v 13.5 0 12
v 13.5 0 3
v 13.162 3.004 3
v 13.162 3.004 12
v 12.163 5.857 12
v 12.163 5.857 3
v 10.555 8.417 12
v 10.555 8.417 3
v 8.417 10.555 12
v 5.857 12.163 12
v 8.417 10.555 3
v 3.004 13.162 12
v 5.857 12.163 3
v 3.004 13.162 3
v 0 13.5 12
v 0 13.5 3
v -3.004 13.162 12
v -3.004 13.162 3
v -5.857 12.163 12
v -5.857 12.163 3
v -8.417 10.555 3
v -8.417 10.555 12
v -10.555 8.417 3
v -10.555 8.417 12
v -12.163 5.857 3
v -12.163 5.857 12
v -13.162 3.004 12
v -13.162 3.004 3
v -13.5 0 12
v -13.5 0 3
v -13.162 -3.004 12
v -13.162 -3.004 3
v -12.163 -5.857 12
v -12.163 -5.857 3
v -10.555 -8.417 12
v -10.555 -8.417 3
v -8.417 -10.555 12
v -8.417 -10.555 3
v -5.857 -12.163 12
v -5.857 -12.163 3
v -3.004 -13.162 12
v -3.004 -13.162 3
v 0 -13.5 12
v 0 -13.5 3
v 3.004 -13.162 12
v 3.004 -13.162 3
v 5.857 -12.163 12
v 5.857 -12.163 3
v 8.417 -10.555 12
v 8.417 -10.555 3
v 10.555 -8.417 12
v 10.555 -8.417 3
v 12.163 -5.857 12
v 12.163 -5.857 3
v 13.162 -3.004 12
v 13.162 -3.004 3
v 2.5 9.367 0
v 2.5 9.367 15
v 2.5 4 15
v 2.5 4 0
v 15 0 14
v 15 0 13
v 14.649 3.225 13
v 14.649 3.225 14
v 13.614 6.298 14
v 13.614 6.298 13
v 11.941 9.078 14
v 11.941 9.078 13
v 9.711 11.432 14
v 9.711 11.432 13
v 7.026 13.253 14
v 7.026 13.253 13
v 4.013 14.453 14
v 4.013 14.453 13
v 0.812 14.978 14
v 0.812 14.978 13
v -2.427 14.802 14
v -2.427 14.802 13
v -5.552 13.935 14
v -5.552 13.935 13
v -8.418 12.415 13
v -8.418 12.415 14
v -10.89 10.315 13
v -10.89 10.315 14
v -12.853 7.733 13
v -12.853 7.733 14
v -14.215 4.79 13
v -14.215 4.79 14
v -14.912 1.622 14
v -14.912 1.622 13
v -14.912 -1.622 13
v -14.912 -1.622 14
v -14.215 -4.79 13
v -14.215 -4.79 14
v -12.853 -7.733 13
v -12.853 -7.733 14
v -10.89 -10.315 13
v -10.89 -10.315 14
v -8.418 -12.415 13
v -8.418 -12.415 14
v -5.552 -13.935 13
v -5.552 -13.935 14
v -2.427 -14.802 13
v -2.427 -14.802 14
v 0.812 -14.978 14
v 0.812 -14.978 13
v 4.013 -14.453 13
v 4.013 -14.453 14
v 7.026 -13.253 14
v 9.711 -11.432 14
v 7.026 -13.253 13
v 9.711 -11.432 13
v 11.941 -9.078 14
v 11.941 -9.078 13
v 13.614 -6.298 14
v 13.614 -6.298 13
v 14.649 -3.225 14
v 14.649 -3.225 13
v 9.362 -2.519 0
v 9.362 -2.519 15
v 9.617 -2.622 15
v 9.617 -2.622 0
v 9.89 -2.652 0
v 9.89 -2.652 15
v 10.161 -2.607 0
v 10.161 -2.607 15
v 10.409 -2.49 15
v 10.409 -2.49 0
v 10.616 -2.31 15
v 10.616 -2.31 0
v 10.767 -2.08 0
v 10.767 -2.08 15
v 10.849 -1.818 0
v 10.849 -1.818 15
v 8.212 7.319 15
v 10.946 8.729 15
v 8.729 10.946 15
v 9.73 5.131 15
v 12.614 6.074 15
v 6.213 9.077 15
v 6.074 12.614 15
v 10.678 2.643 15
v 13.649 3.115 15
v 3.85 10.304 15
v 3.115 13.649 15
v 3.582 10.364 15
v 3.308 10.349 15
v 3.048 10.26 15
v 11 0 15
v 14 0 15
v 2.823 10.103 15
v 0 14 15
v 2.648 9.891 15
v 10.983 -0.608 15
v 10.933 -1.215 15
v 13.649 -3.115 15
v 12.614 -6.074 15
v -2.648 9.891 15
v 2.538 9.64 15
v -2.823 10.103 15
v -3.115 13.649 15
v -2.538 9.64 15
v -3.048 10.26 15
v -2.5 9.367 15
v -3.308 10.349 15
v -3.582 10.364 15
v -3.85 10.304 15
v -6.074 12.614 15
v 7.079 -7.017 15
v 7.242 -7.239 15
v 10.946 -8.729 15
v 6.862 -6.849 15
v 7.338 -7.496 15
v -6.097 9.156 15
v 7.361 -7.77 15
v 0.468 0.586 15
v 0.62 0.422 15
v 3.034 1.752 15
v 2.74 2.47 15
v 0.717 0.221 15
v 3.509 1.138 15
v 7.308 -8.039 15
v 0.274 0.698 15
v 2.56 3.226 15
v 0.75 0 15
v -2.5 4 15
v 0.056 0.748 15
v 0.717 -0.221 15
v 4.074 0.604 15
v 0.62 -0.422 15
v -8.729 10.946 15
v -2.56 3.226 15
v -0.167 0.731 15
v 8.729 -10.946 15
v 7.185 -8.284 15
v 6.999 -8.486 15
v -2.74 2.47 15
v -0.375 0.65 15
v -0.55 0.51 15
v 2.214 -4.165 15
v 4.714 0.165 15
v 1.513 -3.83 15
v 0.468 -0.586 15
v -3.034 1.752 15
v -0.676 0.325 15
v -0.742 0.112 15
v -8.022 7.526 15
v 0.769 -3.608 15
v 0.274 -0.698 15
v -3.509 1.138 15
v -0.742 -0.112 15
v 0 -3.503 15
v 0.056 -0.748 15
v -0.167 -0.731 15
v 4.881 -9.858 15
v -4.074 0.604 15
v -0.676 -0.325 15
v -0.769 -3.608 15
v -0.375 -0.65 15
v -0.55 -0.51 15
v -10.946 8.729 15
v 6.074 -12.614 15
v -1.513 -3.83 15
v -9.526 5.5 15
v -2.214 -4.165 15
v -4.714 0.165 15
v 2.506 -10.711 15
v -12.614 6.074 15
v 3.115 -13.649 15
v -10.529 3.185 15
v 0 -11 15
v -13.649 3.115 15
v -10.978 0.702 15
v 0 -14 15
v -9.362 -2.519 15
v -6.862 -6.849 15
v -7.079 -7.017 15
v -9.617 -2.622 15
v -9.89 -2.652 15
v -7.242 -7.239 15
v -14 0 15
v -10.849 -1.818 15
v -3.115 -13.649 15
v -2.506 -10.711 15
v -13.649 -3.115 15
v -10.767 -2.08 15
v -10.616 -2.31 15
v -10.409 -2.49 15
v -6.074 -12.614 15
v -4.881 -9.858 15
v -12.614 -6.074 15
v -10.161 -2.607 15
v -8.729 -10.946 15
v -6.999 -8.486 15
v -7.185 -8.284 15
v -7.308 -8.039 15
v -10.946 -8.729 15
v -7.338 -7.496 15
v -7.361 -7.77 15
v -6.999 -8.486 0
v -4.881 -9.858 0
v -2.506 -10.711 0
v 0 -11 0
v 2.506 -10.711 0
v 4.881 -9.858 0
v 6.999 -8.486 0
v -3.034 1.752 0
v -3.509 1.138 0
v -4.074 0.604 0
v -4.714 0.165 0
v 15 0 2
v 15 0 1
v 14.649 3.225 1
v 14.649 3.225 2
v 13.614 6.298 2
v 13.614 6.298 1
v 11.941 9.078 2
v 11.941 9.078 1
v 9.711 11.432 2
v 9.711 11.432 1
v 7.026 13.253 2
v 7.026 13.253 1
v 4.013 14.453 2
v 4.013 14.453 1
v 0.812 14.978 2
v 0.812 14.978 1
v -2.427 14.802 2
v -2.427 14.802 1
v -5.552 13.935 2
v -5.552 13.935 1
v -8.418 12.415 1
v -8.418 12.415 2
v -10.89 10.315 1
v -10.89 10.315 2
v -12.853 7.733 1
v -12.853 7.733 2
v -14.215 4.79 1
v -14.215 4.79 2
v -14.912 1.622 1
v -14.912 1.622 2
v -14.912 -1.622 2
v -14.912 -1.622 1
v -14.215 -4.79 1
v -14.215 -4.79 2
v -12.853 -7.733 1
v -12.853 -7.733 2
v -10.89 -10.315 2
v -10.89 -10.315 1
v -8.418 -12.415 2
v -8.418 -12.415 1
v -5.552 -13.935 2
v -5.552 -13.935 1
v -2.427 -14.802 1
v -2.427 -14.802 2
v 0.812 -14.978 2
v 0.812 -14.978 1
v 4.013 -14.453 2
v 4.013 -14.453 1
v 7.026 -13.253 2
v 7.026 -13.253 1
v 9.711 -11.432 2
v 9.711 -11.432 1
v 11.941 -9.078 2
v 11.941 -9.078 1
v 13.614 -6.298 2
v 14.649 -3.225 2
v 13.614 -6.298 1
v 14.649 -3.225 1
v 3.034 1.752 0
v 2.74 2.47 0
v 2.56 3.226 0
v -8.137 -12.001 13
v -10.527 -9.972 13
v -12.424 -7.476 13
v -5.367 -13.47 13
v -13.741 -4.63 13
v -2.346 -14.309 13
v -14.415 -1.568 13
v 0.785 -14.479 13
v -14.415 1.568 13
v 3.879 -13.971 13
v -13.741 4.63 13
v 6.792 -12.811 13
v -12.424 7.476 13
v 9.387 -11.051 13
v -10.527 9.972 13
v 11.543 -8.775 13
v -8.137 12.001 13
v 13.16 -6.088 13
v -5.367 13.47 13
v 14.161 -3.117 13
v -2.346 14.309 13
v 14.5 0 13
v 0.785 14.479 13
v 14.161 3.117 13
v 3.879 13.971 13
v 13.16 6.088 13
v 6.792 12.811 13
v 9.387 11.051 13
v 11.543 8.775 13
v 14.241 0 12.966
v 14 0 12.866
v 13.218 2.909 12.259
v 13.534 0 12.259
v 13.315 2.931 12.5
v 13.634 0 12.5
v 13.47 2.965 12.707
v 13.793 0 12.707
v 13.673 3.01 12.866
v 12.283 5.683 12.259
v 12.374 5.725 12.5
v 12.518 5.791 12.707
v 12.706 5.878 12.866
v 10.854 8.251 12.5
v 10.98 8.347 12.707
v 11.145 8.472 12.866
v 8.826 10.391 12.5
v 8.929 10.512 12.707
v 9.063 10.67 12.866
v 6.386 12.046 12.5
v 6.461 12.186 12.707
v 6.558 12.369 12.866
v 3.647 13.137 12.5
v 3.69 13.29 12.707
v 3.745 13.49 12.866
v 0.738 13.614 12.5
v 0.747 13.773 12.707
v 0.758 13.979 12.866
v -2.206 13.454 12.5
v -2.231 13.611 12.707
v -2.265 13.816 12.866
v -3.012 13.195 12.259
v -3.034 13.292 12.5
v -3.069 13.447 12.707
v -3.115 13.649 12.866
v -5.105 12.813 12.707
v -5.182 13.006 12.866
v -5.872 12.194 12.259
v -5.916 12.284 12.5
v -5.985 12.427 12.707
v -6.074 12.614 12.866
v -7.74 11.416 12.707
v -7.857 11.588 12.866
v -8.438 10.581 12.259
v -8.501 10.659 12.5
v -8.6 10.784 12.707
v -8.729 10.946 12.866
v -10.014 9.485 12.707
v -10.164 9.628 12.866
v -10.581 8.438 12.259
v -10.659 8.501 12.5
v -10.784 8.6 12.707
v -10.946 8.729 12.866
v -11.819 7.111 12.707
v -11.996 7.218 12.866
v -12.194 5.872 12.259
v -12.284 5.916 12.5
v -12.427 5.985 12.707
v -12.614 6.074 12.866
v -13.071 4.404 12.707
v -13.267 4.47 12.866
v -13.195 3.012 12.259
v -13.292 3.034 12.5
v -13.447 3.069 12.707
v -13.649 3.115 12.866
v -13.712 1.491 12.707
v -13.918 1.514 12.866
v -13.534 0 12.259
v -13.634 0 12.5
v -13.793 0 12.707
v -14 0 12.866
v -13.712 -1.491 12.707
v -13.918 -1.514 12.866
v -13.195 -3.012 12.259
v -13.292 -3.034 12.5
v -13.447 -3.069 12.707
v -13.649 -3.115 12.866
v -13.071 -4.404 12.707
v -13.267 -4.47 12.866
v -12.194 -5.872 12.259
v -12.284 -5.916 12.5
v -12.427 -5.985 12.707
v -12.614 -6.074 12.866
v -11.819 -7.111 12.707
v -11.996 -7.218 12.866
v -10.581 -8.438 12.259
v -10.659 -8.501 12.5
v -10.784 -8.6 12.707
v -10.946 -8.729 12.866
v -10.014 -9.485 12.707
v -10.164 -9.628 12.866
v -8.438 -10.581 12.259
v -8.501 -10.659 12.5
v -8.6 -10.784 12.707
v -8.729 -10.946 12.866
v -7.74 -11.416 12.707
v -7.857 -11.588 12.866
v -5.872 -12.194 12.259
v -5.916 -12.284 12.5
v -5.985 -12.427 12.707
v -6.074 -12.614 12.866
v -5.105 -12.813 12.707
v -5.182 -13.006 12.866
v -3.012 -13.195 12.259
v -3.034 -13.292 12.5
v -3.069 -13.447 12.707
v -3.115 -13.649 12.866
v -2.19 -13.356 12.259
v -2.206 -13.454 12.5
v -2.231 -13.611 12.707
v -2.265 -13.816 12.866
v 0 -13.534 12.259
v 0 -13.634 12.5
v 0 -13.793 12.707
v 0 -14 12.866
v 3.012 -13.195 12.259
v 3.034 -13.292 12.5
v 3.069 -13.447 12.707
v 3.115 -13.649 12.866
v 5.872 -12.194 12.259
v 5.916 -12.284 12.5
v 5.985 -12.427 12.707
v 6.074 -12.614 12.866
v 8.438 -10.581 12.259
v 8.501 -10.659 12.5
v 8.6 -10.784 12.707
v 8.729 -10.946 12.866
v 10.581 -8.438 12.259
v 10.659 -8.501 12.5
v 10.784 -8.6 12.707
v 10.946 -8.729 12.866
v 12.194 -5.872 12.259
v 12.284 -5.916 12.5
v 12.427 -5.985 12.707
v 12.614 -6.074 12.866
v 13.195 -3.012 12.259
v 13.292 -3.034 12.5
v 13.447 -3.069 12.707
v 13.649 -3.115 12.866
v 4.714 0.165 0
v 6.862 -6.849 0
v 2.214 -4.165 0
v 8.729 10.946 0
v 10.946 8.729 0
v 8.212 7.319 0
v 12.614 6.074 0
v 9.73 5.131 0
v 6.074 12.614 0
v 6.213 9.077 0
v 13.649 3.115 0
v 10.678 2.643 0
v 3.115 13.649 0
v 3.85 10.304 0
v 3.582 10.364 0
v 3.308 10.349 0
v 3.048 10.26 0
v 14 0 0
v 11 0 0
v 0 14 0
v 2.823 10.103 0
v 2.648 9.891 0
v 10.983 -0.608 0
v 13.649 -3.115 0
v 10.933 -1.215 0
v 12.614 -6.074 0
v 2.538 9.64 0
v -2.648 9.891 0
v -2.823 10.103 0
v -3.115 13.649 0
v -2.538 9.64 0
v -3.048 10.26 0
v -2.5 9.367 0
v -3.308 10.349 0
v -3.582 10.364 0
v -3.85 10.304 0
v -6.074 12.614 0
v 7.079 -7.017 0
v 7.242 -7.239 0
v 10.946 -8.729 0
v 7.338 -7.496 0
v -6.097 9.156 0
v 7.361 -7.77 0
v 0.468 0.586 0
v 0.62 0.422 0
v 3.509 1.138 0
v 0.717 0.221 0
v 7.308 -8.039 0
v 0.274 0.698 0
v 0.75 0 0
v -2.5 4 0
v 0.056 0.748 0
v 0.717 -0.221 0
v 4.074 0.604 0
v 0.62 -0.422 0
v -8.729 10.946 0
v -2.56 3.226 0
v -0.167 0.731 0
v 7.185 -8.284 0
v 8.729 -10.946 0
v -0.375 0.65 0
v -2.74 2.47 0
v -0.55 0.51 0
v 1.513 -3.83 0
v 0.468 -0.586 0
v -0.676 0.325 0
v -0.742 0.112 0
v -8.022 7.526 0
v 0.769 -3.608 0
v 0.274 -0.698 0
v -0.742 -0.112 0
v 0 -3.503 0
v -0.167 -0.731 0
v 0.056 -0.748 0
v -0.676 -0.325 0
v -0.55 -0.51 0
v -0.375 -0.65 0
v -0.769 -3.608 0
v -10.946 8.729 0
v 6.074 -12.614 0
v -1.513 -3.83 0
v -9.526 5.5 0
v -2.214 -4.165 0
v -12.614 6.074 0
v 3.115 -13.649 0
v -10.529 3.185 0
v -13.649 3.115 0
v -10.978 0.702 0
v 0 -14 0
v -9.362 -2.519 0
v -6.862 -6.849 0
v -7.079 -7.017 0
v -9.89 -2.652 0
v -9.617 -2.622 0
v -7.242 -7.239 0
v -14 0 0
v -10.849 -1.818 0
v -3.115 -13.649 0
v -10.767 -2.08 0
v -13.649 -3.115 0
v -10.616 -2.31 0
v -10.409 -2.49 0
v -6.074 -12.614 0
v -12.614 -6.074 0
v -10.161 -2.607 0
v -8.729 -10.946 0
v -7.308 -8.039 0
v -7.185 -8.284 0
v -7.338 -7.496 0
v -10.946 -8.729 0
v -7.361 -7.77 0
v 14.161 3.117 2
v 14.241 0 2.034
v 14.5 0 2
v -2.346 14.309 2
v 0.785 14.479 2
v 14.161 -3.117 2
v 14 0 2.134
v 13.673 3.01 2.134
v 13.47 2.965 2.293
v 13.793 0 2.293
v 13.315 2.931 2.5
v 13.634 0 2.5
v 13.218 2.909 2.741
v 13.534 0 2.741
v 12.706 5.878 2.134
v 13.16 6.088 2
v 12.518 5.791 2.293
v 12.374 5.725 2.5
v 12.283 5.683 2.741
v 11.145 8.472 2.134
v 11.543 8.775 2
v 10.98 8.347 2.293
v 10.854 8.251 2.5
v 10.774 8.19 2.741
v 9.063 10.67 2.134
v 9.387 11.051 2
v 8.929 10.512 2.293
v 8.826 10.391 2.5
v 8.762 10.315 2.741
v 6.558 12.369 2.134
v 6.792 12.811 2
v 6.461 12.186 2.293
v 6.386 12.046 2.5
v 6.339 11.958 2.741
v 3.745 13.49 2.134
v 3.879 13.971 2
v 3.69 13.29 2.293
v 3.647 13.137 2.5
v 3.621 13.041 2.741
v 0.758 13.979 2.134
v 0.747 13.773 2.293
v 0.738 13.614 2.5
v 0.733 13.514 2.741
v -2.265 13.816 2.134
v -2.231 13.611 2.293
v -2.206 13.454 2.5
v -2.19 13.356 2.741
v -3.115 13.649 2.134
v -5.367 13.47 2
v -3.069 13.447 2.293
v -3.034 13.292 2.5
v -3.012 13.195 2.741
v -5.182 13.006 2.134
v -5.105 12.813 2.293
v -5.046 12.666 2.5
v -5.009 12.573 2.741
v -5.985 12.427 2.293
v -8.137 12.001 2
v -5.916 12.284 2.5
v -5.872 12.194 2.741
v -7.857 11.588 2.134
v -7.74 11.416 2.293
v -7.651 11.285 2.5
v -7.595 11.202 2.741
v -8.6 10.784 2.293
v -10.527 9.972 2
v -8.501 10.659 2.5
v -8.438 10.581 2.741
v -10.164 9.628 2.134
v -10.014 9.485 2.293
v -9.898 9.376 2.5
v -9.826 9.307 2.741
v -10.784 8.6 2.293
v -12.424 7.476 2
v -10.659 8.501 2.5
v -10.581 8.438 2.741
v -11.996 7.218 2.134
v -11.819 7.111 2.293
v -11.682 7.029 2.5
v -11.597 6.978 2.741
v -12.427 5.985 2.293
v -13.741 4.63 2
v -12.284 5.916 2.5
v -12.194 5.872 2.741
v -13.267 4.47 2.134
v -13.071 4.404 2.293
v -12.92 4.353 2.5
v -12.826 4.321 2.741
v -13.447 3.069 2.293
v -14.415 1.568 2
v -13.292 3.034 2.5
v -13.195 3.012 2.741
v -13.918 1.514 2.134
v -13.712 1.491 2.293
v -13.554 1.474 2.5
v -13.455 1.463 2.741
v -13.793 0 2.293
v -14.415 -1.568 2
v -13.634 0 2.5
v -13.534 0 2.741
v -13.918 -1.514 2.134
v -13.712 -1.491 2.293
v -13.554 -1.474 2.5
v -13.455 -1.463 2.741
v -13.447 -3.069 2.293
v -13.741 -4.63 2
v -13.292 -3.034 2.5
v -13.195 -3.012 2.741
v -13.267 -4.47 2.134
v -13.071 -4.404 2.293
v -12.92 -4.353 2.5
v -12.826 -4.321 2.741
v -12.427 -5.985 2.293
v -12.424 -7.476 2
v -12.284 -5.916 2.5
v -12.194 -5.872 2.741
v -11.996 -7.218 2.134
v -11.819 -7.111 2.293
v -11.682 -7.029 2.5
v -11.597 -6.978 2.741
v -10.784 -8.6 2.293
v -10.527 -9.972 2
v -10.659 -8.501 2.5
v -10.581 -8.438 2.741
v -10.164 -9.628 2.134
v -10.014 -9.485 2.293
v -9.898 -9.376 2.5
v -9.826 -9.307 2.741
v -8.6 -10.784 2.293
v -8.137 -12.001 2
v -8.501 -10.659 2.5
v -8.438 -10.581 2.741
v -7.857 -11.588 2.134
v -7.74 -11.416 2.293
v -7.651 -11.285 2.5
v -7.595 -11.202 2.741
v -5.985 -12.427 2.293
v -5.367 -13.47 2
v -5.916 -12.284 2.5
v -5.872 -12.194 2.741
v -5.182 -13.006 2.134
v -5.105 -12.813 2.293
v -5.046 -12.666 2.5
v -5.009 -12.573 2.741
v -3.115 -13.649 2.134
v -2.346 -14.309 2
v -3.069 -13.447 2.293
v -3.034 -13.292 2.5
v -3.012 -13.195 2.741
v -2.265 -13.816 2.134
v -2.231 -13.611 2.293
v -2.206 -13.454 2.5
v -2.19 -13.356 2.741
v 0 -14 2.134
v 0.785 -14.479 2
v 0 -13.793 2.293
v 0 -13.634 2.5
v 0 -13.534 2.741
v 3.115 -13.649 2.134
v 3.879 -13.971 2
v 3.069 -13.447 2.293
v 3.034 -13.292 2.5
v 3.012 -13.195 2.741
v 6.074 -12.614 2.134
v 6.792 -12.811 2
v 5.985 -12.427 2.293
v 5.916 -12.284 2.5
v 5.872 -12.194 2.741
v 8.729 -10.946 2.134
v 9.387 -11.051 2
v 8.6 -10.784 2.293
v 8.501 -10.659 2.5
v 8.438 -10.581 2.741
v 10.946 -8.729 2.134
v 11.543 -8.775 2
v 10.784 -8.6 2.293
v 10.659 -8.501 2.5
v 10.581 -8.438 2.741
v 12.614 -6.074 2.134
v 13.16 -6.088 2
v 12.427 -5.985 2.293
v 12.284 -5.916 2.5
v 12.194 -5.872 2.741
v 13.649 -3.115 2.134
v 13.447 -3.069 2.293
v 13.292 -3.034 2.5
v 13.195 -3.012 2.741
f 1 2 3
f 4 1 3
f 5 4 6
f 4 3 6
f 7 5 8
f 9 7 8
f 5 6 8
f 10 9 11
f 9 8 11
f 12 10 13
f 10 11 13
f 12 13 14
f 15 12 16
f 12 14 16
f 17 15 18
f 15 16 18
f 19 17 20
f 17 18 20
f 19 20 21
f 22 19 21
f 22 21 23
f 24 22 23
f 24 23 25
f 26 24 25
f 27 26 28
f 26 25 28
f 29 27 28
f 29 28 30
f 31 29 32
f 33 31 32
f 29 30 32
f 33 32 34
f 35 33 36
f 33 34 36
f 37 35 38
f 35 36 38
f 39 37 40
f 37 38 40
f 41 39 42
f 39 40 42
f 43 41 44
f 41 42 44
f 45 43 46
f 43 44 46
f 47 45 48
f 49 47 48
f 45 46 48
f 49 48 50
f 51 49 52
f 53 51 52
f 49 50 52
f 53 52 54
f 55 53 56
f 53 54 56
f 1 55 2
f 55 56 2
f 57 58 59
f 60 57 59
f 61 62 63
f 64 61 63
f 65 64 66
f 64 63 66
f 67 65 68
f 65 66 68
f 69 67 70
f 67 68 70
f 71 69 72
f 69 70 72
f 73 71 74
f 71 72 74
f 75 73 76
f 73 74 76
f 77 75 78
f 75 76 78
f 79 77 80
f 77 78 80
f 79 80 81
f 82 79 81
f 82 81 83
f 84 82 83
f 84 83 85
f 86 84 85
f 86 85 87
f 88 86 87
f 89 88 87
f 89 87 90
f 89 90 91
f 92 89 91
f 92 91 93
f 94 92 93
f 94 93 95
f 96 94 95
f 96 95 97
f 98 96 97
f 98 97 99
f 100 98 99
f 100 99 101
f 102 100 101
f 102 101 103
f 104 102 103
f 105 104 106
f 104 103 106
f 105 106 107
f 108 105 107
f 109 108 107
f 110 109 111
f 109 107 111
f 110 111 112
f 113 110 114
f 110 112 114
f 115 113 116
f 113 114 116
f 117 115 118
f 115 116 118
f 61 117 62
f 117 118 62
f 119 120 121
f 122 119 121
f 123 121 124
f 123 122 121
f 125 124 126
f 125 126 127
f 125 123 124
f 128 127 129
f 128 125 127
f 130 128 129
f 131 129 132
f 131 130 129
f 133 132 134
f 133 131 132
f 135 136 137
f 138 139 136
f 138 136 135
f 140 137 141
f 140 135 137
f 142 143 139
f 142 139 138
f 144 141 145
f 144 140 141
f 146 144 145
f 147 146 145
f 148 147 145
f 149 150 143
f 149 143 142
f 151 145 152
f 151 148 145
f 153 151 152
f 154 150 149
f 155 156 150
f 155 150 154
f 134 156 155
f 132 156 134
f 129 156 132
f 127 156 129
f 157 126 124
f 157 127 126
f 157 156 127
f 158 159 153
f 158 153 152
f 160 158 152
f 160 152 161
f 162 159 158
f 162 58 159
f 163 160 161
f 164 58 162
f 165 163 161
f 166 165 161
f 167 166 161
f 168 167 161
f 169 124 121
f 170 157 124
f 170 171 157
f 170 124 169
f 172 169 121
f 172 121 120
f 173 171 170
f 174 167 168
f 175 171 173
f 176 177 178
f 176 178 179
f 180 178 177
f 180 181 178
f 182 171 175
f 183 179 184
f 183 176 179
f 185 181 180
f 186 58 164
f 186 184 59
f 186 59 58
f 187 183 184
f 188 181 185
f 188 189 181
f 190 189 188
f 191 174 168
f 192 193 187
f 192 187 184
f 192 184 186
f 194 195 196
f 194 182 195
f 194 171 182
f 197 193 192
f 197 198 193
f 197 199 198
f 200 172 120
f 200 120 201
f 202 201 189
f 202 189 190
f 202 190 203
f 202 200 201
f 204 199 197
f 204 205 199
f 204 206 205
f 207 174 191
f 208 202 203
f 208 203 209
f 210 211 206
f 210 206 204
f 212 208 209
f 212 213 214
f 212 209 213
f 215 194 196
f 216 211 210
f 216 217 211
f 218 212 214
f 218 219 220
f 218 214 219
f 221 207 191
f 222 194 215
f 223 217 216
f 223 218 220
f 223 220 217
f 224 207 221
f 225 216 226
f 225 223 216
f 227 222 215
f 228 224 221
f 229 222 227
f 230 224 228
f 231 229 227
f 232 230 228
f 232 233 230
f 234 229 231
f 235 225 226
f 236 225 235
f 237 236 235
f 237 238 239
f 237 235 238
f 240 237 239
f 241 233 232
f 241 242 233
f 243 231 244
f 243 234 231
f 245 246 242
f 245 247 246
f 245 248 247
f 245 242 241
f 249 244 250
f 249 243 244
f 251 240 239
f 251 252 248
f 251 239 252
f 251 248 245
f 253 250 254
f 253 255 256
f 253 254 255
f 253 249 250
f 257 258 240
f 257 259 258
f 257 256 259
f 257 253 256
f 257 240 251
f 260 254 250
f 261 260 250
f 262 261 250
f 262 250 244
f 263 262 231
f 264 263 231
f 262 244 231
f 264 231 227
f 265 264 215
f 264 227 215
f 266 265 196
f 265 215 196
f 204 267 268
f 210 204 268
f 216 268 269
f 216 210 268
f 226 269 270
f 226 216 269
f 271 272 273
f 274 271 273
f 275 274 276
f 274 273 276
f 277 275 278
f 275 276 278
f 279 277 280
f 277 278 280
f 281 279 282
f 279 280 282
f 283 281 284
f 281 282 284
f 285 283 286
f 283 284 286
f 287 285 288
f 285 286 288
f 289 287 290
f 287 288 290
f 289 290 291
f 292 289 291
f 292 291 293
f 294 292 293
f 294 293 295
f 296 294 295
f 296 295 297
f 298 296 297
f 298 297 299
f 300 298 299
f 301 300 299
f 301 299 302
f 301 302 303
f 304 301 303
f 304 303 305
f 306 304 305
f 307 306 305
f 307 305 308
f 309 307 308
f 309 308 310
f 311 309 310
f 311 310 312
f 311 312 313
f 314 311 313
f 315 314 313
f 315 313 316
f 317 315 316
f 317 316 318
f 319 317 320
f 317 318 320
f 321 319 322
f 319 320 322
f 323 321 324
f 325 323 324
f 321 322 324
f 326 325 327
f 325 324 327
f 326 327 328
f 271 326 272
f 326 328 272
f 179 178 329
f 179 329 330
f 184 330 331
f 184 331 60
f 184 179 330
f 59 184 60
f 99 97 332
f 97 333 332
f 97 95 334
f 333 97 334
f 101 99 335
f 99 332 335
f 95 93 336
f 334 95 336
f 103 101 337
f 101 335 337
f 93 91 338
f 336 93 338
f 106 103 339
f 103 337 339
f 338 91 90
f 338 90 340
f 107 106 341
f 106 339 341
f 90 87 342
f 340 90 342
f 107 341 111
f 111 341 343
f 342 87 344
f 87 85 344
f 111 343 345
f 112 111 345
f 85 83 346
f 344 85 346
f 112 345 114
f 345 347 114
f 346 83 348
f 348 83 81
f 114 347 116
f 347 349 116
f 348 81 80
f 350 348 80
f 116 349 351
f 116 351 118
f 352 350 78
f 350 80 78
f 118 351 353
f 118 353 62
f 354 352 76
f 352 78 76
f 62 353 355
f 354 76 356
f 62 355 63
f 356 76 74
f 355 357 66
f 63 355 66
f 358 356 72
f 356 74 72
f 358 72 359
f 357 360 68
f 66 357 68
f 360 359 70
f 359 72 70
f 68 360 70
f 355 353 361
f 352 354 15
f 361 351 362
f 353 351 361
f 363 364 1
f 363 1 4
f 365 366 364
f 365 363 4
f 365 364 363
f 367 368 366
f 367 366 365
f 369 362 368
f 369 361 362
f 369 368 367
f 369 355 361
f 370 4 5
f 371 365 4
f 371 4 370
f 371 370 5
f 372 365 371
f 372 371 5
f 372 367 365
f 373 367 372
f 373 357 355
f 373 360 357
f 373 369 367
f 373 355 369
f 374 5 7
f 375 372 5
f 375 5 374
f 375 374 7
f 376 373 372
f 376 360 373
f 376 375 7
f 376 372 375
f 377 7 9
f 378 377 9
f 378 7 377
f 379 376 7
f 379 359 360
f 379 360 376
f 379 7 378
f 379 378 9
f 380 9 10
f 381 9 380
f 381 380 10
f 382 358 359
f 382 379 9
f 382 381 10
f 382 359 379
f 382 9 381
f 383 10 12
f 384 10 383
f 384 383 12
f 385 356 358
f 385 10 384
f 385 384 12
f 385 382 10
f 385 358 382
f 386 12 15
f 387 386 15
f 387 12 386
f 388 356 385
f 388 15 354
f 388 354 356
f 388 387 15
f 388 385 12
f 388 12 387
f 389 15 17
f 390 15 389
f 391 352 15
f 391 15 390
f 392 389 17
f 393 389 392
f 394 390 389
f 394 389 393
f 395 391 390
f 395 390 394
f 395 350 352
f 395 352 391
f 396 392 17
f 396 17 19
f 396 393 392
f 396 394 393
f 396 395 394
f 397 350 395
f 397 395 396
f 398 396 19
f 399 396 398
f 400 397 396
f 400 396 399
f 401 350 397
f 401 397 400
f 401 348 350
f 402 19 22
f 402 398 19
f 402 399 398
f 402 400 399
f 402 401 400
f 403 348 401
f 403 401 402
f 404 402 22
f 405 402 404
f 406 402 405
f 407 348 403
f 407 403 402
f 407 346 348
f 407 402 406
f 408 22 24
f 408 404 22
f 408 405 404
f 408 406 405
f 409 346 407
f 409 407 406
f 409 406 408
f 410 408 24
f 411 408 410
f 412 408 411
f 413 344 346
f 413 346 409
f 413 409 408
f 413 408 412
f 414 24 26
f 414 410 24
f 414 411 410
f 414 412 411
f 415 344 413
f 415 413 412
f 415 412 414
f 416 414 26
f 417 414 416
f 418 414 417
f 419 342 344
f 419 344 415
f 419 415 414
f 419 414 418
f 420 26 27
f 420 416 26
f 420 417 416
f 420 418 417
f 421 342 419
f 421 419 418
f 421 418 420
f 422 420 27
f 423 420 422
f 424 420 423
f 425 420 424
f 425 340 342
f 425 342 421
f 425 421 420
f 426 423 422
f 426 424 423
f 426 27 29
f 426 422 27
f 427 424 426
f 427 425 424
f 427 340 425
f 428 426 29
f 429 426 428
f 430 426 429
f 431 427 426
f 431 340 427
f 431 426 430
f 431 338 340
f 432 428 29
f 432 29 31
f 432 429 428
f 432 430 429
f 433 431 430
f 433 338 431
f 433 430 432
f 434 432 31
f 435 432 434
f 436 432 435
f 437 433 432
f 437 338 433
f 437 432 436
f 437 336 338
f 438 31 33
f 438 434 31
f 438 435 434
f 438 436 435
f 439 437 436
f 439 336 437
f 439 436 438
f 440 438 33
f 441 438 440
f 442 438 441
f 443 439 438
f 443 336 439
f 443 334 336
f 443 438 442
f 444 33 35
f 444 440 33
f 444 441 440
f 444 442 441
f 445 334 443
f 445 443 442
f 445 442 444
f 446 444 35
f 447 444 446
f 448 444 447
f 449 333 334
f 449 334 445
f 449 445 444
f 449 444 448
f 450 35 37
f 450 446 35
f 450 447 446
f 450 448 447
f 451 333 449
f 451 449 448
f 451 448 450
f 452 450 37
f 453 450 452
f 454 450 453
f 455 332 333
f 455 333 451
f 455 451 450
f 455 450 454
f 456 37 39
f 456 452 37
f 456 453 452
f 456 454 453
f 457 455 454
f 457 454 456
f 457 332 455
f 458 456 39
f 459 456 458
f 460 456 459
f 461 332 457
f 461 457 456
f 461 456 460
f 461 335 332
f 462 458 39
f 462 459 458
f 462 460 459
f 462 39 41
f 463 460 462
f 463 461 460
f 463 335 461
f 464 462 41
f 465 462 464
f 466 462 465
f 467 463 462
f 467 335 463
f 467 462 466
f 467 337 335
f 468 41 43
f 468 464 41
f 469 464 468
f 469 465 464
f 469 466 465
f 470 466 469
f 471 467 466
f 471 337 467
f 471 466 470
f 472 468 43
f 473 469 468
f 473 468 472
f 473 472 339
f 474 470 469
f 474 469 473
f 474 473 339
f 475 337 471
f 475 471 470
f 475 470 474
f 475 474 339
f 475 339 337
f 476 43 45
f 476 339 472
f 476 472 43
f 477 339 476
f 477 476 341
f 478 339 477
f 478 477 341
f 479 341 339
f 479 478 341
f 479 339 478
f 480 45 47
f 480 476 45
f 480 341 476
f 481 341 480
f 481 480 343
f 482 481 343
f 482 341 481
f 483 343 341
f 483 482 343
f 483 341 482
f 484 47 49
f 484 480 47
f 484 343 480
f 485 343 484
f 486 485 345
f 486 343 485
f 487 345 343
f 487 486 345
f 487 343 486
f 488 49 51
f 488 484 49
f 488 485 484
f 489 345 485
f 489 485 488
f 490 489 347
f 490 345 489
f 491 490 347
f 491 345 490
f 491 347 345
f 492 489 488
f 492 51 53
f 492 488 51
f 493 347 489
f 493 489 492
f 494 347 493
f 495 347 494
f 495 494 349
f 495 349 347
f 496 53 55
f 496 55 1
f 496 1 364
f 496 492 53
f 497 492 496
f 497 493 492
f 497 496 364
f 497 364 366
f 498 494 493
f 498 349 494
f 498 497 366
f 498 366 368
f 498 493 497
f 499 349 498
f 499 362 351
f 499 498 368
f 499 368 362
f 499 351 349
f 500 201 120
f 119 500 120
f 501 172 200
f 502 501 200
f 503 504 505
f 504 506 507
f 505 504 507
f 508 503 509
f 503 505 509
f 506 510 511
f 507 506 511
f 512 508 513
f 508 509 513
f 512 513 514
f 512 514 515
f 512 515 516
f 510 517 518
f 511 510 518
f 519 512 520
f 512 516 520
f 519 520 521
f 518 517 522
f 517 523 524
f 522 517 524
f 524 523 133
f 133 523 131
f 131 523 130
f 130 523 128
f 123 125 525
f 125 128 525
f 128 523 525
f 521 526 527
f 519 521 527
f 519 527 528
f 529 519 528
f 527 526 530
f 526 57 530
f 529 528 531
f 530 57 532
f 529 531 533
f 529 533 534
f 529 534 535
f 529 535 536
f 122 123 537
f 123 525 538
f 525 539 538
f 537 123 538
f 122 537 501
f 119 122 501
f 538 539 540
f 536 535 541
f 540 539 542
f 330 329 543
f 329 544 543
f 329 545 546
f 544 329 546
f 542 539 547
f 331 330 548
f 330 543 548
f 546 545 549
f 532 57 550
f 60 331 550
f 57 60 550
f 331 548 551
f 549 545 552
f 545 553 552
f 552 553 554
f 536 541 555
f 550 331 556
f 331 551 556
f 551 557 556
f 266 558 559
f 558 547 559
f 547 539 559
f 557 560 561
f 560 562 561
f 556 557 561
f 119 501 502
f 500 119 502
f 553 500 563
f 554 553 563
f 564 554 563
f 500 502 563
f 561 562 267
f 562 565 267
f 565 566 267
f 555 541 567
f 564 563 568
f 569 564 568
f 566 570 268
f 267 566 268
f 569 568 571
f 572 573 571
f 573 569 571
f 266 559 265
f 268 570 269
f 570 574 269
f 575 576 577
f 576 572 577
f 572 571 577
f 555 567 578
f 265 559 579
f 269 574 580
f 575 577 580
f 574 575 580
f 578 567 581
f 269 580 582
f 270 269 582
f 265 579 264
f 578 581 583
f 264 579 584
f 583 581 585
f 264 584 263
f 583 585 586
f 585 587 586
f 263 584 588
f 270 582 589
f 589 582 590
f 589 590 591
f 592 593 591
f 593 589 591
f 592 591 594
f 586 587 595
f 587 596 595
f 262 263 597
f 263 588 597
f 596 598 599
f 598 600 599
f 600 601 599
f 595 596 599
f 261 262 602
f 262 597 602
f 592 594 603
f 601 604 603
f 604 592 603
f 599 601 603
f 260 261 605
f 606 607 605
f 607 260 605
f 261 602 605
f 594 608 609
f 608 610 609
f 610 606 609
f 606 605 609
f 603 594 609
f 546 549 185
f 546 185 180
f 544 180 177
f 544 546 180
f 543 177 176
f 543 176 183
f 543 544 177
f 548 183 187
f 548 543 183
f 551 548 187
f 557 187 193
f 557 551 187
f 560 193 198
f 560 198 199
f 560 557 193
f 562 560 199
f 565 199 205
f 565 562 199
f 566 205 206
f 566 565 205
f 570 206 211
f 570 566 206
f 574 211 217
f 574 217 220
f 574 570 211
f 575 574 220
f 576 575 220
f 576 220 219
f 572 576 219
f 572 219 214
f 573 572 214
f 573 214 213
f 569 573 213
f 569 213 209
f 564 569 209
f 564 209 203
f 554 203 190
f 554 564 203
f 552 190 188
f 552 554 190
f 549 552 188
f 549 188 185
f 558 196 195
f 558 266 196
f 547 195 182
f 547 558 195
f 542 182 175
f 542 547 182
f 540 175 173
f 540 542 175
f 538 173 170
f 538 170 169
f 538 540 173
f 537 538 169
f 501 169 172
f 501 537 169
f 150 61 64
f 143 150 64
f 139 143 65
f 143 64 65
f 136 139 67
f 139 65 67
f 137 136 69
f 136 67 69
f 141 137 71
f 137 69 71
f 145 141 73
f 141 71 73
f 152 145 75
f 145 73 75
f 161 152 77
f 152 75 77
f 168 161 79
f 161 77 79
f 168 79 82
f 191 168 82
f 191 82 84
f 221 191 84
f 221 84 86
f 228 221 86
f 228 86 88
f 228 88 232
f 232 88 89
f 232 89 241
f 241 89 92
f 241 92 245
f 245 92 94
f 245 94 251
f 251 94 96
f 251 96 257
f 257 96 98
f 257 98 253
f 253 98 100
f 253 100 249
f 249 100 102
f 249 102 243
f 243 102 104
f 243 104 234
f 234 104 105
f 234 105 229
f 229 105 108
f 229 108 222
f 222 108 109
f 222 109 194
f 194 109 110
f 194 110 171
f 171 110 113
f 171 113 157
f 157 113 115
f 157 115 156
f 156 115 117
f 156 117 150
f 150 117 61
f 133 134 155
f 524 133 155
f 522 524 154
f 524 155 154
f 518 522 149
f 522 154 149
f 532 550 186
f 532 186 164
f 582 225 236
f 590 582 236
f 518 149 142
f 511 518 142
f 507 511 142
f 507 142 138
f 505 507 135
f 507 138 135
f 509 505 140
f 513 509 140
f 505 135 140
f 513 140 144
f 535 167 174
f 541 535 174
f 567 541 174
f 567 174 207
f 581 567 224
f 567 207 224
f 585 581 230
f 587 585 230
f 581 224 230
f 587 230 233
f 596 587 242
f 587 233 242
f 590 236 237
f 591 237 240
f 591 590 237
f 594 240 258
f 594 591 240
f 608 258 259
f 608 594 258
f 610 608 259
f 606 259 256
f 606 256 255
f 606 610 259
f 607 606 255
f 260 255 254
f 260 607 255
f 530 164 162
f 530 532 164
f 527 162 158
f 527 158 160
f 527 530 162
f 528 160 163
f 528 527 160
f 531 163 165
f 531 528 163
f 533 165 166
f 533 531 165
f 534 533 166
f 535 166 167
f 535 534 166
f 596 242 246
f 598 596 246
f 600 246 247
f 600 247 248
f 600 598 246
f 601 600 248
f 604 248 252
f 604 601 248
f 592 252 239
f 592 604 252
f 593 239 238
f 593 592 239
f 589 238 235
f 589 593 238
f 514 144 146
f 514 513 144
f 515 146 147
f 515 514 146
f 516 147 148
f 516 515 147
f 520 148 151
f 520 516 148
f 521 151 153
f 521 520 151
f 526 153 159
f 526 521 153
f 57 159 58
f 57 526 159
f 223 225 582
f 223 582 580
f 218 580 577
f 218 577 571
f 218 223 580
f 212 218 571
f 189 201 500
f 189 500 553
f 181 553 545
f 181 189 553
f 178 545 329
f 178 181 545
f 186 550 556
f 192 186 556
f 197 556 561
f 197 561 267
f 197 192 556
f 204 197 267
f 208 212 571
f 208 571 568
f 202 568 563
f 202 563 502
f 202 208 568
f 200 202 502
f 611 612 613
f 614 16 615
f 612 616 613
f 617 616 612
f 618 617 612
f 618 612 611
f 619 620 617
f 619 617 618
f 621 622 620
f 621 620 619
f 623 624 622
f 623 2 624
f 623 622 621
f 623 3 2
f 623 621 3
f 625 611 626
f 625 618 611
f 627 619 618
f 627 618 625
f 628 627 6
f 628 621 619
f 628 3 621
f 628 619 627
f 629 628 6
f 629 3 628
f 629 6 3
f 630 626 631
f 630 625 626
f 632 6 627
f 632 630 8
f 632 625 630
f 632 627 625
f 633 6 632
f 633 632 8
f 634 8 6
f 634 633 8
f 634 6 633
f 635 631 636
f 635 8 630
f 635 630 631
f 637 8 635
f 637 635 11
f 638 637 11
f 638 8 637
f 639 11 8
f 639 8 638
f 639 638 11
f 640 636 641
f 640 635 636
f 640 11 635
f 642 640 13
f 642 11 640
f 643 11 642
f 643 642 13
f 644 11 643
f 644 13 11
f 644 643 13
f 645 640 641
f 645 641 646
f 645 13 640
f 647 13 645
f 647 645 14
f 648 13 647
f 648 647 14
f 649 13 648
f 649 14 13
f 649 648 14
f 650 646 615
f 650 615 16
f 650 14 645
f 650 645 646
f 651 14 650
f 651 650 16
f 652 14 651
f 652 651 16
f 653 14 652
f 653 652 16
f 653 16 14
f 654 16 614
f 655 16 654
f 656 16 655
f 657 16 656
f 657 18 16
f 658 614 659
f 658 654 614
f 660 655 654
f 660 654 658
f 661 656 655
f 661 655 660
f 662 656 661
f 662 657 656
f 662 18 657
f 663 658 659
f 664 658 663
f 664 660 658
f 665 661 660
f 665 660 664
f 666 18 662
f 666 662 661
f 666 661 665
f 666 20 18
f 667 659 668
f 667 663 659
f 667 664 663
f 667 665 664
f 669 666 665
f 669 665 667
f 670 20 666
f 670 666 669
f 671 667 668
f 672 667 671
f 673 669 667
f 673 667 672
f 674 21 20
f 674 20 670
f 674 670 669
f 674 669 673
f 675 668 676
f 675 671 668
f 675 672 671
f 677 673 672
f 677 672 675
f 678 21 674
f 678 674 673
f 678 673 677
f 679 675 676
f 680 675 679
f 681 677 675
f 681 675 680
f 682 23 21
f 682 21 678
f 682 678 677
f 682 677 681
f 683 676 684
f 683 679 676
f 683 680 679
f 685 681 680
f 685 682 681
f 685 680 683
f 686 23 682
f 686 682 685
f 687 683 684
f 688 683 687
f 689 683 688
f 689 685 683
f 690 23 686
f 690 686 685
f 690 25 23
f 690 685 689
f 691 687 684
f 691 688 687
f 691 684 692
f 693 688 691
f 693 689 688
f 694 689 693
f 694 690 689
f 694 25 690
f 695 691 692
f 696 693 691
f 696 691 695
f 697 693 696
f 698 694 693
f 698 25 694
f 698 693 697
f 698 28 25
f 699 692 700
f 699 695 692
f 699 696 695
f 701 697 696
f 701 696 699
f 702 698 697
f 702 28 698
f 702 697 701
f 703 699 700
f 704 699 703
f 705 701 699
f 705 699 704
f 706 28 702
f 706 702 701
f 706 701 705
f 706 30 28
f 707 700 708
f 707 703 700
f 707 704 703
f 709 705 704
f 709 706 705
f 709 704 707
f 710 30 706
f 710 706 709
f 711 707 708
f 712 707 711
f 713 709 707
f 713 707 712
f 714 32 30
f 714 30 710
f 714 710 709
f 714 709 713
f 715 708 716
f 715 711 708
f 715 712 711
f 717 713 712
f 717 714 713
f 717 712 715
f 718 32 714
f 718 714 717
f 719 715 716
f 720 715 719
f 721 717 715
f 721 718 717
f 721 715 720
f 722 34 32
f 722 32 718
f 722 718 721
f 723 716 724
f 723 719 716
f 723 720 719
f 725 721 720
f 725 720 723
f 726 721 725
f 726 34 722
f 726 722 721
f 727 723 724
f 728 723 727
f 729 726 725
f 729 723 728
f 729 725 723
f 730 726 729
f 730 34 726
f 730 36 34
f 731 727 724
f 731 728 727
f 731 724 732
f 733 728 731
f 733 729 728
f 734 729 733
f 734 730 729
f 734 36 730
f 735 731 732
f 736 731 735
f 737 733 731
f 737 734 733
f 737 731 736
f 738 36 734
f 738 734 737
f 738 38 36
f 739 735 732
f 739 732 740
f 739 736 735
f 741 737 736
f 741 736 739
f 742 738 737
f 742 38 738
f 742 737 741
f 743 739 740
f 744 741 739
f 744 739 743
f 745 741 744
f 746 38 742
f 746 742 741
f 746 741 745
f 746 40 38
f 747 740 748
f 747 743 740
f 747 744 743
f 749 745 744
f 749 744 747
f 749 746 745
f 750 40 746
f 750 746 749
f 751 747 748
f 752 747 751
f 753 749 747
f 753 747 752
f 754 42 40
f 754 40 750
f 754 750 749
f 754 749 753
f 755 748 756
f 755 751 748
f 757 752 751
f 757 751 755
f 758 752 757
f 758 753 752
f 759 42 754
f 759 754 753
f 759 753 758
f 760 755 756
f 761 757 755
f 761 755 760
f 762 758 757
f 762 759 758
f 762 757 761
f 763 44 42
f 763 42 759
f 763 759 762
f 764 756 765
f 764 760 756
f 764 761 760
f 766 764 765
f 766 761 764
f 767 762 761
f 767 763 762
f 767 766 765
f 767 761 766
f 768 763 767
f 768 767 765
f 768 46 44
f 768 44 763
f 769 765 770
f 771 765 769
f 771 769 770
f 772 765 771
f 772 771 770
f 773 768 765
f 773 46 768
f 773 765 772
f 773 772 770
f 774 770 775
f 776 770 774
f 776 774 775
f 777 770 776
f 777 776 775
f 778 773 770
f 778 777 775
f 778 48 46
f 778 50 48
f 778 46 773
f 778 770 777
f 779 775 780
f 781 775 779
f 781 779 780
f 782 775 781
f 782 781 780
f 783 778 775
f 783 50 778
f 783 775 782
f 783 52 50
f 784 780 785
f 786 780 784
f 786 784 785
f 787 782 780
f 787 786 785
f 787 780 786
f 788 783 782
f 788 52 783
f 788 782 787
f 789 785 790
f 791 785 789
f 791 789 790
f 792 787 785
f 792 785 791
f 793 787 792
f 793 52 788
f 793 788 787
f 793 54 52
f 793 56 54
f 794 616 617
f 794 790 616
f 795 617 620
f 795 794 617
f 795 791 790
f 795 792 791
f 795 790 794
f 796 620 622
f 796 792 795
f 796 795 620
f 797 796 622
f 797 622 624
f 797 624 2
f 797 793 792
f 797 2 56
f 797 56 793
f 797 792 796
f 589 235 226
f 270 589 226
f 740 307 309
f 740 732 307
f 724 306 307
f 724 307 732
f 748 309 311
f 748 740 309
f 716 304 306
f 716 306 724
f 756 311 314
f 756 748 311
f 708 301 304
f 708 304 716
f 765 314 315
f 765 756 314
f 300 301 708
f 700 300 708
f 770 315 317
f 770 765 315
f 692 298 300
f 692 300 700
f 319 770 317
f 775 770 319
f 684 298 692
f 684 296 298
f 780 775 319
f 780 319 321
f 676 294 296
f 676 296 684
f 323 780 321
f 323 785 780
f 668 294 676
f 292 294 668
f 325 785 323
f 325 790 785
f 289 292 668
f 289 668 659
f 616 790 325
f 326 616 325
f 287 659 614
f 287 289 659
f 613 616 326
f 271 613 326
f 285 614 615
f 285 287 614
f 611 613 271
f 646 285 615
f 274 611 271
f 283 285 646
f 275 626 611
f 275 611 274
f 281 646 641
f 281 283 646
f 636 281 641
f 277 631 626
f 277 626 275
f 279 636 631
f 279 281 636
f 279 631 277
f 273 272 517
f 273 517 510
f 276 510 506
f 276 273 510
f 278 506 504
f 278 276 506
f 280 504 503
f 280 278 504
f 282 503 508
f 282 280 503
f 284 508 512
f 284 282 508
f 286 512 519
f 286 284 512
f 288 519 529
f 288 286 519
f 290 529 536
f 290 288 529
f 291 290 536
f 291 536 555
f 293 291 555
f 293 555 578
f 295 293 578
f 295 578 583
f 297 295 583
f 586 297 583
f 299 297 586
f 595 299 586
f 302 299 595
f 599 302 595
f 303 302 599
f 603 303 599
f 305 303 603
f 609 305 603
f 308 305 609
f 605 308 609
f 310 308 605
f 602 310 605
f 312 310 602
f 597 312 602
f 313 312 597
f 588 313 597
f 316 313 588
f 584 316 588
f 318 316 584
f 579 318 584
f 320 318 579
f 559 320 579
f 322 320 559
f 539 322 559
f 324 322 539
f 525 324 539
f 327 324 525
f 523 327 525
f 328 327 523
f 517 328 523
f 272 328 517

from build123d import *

# Parameters (mm, degrees)
SKETCH1_R           = 15
SKETCH1_R_2         = 0.75
BOSS_EXTRUDE1_DEPTH = 15
CUT_EXTRUDE1_START  = -11
SKETCH2_R           = 15
SKETCH2_R_2         = 13.5
CUT_EXTRUDE1_DEPTH  = 11
FILLET1_R           = 1
CUT_EXTRUDE2_DEPTH  = 26.980762114
FILLET2_R           = 5
FILLET3_R           = 1
CHAMFER2_SIZE       = 1


with BuildPart() as part:
    # Sketch1 → Boss-Extrude1 (new body)
    with BuildSketch(Plane.XY):
        Circle(SKETCH1_R)
        Circle(SKETCH1_R_2, mode=Mode.SUBTRACT)
    extrude(amount=BOSS_EXTRUDE1_DEPTH)

    # Sketch2 → Cut-Extrude1 (cut)
    with BuildSketch(Plane.XY.offset(13).offset(CUT_EXTRUDE1_START)):
        Circle(SKETCH2_R)
        Circle(SKETCH2_R_2, mode=Mode.SUBTRACT)
    extrude(amount=CUT_EXTRUDE1_DEPTH, mode=Mode.SUBTRACT)

    # Fillet1
    fillet1_edges = [part.edges().sort_by_distance(p)[0] for p in [
        (-13.5, 0, 2),
        (-13.5, 0, 13),
    ]]
    fillet(fillet1_edges, radius=FILLET1_R)

    # Sketch4 → Cut-Extrude2 (cut, through all)
    with BuildSketch(Plane.XY.offset(15)):
        with BuildLine():
            Line((2.5, 10.712142643), (2.5, 2.449489743))
            ThreePointArc((2.5, 2.449489743), (3.031088913, 1.75), (3.371320344, 0.940318638))
            Line((3.371320344, 0.940318638), (10.526987658, -3.191007812))
            ThreePointArc((10.526987658, -3.191007812), (10.881104361, -1.612937656), (11, 0))
            ThreePointArc((11, 0), (8.61684397, 6.837397166), (2.5, 10.712142643))
        make_face()
        with BuildLine():
            ThreePointArc((-8.026987658, -7.521134831), (0, -11), (8.026987658, -7.521134831))
            Line((8.026987658, -7.521134831), (0.871320344, -3.389808381))
            ThreePointArc((0.871320344, -3.389808381), (0, -3.5), (-0.871320344, -3.389808381))
            Line((-0.871320344, -3.389808381), (-8.026987658, -7.521134831))
        make_face()
        with BuildLine():
            ThreePointArc((-3.371320344, 0.940318638), (-3.031088913, 1.75), (-2.5, 2.449489743))
            Line((-2.5, 2.449489743), (-2.5, 10.712142643))
            ThreePointArc((-2.5, 10.712142643), (-9.526279442, 5.5), (-10.526987658, -3.191007812))
            Line((-10.526987658, -3.191007812), (-3.371320344, 0.940318638))
        make_face()
    extrude(amount=-CUT_EXTRUDE2_DEPTH, mode=Mode.SUBTRACT)

    # Fillet2
    # the kernel refuses this fillet: 5 mm, written as the material it adds along each edge
    with BuildSketch(Plane(origin=(-0.871320344, -3.389808381, 15), x_dir=(0.994067927349263, -0.108761003192966, 0), z_dir=(0, 0, -1)), Plane(origin=(3.371320344, 0.940318638, 15), x_dir=(-0.40284417196844124, 0.9152685797682891, 0), z_dir=(0, 0, -1)), Plane(origin=(-2.5, 2.449489743, 15), x_dir=(-0.5912237553808212, -0.8065075765753221, 0), z_dir=(0, 0, -1))) as fillet2_piece_1:
        with BuildLine():
            CenterArc((1.705620507, 4.94923638), FILLET2_R, 233.756102233, 28.072486936)
            Line((-1.25049827, 0.916698497), (0, 0))
            ThreePointArc((0, 0), (0.497472648, 0.035534534), (0.994945296, 0))
        make_face()
    extrude(amount=15)
    with BuildSketch(Plane(origin=(0.871320344, -3.389808381, 15), x_dir=(0.8660254037844362, -0.5000000000000042, 0), z_dir=(0, 0, -1)), Plane(origin=(2.5, 2.449489743, 15), x_dir=(0, 1, 0), z_dir=(0, 0, -1)), Plane(origin=(-3.371320344, 0.940318638, 15), x_dir=(-0.8660254037844451, -0.49999999999998884, 0), z_dir=(0, 0, -1))) as fillet2_piece_2:
        with BuildLine():
            CenterArc((1.550510257, 5), FILLET2_R, 241.927513064, 28.072486936)
            ThreePointArc((-0.802430919, 0.588235294), (-0.380206599, 0.322776518), (0, 0))
            Line((0, 0), (1.550510257, 0))
        make_face()
    extrude(amount=15)

    # Fillet3
    fillet3_edges = [part.edges().sort_by_distance(p)[0] for p in [
        (-2.5, 10.712142643, 7.5),
        (-10.526987658, -3.191007812, 7.5),
        (-8.026987658, -7.521134831, 7.5),
        (8.026987658, -7.521134831, 7.5),
        (10.526987658, -3.191007812, 7.5),
        (2.5, 10.712142643, 7.5),
    ]]
    fillet(fillet3_edges, radius=FILLET3_R)

    # Chamfer2
    chamfer2_edges = [part.edges().sort_by_distance(p)[0] for p in [
        (-15, 0, 0),
        (-15, 0, 15),
    ]]
    chamfer(chamfer2_edges, length=CHAMFER2_SIZE)


solid = part.part
